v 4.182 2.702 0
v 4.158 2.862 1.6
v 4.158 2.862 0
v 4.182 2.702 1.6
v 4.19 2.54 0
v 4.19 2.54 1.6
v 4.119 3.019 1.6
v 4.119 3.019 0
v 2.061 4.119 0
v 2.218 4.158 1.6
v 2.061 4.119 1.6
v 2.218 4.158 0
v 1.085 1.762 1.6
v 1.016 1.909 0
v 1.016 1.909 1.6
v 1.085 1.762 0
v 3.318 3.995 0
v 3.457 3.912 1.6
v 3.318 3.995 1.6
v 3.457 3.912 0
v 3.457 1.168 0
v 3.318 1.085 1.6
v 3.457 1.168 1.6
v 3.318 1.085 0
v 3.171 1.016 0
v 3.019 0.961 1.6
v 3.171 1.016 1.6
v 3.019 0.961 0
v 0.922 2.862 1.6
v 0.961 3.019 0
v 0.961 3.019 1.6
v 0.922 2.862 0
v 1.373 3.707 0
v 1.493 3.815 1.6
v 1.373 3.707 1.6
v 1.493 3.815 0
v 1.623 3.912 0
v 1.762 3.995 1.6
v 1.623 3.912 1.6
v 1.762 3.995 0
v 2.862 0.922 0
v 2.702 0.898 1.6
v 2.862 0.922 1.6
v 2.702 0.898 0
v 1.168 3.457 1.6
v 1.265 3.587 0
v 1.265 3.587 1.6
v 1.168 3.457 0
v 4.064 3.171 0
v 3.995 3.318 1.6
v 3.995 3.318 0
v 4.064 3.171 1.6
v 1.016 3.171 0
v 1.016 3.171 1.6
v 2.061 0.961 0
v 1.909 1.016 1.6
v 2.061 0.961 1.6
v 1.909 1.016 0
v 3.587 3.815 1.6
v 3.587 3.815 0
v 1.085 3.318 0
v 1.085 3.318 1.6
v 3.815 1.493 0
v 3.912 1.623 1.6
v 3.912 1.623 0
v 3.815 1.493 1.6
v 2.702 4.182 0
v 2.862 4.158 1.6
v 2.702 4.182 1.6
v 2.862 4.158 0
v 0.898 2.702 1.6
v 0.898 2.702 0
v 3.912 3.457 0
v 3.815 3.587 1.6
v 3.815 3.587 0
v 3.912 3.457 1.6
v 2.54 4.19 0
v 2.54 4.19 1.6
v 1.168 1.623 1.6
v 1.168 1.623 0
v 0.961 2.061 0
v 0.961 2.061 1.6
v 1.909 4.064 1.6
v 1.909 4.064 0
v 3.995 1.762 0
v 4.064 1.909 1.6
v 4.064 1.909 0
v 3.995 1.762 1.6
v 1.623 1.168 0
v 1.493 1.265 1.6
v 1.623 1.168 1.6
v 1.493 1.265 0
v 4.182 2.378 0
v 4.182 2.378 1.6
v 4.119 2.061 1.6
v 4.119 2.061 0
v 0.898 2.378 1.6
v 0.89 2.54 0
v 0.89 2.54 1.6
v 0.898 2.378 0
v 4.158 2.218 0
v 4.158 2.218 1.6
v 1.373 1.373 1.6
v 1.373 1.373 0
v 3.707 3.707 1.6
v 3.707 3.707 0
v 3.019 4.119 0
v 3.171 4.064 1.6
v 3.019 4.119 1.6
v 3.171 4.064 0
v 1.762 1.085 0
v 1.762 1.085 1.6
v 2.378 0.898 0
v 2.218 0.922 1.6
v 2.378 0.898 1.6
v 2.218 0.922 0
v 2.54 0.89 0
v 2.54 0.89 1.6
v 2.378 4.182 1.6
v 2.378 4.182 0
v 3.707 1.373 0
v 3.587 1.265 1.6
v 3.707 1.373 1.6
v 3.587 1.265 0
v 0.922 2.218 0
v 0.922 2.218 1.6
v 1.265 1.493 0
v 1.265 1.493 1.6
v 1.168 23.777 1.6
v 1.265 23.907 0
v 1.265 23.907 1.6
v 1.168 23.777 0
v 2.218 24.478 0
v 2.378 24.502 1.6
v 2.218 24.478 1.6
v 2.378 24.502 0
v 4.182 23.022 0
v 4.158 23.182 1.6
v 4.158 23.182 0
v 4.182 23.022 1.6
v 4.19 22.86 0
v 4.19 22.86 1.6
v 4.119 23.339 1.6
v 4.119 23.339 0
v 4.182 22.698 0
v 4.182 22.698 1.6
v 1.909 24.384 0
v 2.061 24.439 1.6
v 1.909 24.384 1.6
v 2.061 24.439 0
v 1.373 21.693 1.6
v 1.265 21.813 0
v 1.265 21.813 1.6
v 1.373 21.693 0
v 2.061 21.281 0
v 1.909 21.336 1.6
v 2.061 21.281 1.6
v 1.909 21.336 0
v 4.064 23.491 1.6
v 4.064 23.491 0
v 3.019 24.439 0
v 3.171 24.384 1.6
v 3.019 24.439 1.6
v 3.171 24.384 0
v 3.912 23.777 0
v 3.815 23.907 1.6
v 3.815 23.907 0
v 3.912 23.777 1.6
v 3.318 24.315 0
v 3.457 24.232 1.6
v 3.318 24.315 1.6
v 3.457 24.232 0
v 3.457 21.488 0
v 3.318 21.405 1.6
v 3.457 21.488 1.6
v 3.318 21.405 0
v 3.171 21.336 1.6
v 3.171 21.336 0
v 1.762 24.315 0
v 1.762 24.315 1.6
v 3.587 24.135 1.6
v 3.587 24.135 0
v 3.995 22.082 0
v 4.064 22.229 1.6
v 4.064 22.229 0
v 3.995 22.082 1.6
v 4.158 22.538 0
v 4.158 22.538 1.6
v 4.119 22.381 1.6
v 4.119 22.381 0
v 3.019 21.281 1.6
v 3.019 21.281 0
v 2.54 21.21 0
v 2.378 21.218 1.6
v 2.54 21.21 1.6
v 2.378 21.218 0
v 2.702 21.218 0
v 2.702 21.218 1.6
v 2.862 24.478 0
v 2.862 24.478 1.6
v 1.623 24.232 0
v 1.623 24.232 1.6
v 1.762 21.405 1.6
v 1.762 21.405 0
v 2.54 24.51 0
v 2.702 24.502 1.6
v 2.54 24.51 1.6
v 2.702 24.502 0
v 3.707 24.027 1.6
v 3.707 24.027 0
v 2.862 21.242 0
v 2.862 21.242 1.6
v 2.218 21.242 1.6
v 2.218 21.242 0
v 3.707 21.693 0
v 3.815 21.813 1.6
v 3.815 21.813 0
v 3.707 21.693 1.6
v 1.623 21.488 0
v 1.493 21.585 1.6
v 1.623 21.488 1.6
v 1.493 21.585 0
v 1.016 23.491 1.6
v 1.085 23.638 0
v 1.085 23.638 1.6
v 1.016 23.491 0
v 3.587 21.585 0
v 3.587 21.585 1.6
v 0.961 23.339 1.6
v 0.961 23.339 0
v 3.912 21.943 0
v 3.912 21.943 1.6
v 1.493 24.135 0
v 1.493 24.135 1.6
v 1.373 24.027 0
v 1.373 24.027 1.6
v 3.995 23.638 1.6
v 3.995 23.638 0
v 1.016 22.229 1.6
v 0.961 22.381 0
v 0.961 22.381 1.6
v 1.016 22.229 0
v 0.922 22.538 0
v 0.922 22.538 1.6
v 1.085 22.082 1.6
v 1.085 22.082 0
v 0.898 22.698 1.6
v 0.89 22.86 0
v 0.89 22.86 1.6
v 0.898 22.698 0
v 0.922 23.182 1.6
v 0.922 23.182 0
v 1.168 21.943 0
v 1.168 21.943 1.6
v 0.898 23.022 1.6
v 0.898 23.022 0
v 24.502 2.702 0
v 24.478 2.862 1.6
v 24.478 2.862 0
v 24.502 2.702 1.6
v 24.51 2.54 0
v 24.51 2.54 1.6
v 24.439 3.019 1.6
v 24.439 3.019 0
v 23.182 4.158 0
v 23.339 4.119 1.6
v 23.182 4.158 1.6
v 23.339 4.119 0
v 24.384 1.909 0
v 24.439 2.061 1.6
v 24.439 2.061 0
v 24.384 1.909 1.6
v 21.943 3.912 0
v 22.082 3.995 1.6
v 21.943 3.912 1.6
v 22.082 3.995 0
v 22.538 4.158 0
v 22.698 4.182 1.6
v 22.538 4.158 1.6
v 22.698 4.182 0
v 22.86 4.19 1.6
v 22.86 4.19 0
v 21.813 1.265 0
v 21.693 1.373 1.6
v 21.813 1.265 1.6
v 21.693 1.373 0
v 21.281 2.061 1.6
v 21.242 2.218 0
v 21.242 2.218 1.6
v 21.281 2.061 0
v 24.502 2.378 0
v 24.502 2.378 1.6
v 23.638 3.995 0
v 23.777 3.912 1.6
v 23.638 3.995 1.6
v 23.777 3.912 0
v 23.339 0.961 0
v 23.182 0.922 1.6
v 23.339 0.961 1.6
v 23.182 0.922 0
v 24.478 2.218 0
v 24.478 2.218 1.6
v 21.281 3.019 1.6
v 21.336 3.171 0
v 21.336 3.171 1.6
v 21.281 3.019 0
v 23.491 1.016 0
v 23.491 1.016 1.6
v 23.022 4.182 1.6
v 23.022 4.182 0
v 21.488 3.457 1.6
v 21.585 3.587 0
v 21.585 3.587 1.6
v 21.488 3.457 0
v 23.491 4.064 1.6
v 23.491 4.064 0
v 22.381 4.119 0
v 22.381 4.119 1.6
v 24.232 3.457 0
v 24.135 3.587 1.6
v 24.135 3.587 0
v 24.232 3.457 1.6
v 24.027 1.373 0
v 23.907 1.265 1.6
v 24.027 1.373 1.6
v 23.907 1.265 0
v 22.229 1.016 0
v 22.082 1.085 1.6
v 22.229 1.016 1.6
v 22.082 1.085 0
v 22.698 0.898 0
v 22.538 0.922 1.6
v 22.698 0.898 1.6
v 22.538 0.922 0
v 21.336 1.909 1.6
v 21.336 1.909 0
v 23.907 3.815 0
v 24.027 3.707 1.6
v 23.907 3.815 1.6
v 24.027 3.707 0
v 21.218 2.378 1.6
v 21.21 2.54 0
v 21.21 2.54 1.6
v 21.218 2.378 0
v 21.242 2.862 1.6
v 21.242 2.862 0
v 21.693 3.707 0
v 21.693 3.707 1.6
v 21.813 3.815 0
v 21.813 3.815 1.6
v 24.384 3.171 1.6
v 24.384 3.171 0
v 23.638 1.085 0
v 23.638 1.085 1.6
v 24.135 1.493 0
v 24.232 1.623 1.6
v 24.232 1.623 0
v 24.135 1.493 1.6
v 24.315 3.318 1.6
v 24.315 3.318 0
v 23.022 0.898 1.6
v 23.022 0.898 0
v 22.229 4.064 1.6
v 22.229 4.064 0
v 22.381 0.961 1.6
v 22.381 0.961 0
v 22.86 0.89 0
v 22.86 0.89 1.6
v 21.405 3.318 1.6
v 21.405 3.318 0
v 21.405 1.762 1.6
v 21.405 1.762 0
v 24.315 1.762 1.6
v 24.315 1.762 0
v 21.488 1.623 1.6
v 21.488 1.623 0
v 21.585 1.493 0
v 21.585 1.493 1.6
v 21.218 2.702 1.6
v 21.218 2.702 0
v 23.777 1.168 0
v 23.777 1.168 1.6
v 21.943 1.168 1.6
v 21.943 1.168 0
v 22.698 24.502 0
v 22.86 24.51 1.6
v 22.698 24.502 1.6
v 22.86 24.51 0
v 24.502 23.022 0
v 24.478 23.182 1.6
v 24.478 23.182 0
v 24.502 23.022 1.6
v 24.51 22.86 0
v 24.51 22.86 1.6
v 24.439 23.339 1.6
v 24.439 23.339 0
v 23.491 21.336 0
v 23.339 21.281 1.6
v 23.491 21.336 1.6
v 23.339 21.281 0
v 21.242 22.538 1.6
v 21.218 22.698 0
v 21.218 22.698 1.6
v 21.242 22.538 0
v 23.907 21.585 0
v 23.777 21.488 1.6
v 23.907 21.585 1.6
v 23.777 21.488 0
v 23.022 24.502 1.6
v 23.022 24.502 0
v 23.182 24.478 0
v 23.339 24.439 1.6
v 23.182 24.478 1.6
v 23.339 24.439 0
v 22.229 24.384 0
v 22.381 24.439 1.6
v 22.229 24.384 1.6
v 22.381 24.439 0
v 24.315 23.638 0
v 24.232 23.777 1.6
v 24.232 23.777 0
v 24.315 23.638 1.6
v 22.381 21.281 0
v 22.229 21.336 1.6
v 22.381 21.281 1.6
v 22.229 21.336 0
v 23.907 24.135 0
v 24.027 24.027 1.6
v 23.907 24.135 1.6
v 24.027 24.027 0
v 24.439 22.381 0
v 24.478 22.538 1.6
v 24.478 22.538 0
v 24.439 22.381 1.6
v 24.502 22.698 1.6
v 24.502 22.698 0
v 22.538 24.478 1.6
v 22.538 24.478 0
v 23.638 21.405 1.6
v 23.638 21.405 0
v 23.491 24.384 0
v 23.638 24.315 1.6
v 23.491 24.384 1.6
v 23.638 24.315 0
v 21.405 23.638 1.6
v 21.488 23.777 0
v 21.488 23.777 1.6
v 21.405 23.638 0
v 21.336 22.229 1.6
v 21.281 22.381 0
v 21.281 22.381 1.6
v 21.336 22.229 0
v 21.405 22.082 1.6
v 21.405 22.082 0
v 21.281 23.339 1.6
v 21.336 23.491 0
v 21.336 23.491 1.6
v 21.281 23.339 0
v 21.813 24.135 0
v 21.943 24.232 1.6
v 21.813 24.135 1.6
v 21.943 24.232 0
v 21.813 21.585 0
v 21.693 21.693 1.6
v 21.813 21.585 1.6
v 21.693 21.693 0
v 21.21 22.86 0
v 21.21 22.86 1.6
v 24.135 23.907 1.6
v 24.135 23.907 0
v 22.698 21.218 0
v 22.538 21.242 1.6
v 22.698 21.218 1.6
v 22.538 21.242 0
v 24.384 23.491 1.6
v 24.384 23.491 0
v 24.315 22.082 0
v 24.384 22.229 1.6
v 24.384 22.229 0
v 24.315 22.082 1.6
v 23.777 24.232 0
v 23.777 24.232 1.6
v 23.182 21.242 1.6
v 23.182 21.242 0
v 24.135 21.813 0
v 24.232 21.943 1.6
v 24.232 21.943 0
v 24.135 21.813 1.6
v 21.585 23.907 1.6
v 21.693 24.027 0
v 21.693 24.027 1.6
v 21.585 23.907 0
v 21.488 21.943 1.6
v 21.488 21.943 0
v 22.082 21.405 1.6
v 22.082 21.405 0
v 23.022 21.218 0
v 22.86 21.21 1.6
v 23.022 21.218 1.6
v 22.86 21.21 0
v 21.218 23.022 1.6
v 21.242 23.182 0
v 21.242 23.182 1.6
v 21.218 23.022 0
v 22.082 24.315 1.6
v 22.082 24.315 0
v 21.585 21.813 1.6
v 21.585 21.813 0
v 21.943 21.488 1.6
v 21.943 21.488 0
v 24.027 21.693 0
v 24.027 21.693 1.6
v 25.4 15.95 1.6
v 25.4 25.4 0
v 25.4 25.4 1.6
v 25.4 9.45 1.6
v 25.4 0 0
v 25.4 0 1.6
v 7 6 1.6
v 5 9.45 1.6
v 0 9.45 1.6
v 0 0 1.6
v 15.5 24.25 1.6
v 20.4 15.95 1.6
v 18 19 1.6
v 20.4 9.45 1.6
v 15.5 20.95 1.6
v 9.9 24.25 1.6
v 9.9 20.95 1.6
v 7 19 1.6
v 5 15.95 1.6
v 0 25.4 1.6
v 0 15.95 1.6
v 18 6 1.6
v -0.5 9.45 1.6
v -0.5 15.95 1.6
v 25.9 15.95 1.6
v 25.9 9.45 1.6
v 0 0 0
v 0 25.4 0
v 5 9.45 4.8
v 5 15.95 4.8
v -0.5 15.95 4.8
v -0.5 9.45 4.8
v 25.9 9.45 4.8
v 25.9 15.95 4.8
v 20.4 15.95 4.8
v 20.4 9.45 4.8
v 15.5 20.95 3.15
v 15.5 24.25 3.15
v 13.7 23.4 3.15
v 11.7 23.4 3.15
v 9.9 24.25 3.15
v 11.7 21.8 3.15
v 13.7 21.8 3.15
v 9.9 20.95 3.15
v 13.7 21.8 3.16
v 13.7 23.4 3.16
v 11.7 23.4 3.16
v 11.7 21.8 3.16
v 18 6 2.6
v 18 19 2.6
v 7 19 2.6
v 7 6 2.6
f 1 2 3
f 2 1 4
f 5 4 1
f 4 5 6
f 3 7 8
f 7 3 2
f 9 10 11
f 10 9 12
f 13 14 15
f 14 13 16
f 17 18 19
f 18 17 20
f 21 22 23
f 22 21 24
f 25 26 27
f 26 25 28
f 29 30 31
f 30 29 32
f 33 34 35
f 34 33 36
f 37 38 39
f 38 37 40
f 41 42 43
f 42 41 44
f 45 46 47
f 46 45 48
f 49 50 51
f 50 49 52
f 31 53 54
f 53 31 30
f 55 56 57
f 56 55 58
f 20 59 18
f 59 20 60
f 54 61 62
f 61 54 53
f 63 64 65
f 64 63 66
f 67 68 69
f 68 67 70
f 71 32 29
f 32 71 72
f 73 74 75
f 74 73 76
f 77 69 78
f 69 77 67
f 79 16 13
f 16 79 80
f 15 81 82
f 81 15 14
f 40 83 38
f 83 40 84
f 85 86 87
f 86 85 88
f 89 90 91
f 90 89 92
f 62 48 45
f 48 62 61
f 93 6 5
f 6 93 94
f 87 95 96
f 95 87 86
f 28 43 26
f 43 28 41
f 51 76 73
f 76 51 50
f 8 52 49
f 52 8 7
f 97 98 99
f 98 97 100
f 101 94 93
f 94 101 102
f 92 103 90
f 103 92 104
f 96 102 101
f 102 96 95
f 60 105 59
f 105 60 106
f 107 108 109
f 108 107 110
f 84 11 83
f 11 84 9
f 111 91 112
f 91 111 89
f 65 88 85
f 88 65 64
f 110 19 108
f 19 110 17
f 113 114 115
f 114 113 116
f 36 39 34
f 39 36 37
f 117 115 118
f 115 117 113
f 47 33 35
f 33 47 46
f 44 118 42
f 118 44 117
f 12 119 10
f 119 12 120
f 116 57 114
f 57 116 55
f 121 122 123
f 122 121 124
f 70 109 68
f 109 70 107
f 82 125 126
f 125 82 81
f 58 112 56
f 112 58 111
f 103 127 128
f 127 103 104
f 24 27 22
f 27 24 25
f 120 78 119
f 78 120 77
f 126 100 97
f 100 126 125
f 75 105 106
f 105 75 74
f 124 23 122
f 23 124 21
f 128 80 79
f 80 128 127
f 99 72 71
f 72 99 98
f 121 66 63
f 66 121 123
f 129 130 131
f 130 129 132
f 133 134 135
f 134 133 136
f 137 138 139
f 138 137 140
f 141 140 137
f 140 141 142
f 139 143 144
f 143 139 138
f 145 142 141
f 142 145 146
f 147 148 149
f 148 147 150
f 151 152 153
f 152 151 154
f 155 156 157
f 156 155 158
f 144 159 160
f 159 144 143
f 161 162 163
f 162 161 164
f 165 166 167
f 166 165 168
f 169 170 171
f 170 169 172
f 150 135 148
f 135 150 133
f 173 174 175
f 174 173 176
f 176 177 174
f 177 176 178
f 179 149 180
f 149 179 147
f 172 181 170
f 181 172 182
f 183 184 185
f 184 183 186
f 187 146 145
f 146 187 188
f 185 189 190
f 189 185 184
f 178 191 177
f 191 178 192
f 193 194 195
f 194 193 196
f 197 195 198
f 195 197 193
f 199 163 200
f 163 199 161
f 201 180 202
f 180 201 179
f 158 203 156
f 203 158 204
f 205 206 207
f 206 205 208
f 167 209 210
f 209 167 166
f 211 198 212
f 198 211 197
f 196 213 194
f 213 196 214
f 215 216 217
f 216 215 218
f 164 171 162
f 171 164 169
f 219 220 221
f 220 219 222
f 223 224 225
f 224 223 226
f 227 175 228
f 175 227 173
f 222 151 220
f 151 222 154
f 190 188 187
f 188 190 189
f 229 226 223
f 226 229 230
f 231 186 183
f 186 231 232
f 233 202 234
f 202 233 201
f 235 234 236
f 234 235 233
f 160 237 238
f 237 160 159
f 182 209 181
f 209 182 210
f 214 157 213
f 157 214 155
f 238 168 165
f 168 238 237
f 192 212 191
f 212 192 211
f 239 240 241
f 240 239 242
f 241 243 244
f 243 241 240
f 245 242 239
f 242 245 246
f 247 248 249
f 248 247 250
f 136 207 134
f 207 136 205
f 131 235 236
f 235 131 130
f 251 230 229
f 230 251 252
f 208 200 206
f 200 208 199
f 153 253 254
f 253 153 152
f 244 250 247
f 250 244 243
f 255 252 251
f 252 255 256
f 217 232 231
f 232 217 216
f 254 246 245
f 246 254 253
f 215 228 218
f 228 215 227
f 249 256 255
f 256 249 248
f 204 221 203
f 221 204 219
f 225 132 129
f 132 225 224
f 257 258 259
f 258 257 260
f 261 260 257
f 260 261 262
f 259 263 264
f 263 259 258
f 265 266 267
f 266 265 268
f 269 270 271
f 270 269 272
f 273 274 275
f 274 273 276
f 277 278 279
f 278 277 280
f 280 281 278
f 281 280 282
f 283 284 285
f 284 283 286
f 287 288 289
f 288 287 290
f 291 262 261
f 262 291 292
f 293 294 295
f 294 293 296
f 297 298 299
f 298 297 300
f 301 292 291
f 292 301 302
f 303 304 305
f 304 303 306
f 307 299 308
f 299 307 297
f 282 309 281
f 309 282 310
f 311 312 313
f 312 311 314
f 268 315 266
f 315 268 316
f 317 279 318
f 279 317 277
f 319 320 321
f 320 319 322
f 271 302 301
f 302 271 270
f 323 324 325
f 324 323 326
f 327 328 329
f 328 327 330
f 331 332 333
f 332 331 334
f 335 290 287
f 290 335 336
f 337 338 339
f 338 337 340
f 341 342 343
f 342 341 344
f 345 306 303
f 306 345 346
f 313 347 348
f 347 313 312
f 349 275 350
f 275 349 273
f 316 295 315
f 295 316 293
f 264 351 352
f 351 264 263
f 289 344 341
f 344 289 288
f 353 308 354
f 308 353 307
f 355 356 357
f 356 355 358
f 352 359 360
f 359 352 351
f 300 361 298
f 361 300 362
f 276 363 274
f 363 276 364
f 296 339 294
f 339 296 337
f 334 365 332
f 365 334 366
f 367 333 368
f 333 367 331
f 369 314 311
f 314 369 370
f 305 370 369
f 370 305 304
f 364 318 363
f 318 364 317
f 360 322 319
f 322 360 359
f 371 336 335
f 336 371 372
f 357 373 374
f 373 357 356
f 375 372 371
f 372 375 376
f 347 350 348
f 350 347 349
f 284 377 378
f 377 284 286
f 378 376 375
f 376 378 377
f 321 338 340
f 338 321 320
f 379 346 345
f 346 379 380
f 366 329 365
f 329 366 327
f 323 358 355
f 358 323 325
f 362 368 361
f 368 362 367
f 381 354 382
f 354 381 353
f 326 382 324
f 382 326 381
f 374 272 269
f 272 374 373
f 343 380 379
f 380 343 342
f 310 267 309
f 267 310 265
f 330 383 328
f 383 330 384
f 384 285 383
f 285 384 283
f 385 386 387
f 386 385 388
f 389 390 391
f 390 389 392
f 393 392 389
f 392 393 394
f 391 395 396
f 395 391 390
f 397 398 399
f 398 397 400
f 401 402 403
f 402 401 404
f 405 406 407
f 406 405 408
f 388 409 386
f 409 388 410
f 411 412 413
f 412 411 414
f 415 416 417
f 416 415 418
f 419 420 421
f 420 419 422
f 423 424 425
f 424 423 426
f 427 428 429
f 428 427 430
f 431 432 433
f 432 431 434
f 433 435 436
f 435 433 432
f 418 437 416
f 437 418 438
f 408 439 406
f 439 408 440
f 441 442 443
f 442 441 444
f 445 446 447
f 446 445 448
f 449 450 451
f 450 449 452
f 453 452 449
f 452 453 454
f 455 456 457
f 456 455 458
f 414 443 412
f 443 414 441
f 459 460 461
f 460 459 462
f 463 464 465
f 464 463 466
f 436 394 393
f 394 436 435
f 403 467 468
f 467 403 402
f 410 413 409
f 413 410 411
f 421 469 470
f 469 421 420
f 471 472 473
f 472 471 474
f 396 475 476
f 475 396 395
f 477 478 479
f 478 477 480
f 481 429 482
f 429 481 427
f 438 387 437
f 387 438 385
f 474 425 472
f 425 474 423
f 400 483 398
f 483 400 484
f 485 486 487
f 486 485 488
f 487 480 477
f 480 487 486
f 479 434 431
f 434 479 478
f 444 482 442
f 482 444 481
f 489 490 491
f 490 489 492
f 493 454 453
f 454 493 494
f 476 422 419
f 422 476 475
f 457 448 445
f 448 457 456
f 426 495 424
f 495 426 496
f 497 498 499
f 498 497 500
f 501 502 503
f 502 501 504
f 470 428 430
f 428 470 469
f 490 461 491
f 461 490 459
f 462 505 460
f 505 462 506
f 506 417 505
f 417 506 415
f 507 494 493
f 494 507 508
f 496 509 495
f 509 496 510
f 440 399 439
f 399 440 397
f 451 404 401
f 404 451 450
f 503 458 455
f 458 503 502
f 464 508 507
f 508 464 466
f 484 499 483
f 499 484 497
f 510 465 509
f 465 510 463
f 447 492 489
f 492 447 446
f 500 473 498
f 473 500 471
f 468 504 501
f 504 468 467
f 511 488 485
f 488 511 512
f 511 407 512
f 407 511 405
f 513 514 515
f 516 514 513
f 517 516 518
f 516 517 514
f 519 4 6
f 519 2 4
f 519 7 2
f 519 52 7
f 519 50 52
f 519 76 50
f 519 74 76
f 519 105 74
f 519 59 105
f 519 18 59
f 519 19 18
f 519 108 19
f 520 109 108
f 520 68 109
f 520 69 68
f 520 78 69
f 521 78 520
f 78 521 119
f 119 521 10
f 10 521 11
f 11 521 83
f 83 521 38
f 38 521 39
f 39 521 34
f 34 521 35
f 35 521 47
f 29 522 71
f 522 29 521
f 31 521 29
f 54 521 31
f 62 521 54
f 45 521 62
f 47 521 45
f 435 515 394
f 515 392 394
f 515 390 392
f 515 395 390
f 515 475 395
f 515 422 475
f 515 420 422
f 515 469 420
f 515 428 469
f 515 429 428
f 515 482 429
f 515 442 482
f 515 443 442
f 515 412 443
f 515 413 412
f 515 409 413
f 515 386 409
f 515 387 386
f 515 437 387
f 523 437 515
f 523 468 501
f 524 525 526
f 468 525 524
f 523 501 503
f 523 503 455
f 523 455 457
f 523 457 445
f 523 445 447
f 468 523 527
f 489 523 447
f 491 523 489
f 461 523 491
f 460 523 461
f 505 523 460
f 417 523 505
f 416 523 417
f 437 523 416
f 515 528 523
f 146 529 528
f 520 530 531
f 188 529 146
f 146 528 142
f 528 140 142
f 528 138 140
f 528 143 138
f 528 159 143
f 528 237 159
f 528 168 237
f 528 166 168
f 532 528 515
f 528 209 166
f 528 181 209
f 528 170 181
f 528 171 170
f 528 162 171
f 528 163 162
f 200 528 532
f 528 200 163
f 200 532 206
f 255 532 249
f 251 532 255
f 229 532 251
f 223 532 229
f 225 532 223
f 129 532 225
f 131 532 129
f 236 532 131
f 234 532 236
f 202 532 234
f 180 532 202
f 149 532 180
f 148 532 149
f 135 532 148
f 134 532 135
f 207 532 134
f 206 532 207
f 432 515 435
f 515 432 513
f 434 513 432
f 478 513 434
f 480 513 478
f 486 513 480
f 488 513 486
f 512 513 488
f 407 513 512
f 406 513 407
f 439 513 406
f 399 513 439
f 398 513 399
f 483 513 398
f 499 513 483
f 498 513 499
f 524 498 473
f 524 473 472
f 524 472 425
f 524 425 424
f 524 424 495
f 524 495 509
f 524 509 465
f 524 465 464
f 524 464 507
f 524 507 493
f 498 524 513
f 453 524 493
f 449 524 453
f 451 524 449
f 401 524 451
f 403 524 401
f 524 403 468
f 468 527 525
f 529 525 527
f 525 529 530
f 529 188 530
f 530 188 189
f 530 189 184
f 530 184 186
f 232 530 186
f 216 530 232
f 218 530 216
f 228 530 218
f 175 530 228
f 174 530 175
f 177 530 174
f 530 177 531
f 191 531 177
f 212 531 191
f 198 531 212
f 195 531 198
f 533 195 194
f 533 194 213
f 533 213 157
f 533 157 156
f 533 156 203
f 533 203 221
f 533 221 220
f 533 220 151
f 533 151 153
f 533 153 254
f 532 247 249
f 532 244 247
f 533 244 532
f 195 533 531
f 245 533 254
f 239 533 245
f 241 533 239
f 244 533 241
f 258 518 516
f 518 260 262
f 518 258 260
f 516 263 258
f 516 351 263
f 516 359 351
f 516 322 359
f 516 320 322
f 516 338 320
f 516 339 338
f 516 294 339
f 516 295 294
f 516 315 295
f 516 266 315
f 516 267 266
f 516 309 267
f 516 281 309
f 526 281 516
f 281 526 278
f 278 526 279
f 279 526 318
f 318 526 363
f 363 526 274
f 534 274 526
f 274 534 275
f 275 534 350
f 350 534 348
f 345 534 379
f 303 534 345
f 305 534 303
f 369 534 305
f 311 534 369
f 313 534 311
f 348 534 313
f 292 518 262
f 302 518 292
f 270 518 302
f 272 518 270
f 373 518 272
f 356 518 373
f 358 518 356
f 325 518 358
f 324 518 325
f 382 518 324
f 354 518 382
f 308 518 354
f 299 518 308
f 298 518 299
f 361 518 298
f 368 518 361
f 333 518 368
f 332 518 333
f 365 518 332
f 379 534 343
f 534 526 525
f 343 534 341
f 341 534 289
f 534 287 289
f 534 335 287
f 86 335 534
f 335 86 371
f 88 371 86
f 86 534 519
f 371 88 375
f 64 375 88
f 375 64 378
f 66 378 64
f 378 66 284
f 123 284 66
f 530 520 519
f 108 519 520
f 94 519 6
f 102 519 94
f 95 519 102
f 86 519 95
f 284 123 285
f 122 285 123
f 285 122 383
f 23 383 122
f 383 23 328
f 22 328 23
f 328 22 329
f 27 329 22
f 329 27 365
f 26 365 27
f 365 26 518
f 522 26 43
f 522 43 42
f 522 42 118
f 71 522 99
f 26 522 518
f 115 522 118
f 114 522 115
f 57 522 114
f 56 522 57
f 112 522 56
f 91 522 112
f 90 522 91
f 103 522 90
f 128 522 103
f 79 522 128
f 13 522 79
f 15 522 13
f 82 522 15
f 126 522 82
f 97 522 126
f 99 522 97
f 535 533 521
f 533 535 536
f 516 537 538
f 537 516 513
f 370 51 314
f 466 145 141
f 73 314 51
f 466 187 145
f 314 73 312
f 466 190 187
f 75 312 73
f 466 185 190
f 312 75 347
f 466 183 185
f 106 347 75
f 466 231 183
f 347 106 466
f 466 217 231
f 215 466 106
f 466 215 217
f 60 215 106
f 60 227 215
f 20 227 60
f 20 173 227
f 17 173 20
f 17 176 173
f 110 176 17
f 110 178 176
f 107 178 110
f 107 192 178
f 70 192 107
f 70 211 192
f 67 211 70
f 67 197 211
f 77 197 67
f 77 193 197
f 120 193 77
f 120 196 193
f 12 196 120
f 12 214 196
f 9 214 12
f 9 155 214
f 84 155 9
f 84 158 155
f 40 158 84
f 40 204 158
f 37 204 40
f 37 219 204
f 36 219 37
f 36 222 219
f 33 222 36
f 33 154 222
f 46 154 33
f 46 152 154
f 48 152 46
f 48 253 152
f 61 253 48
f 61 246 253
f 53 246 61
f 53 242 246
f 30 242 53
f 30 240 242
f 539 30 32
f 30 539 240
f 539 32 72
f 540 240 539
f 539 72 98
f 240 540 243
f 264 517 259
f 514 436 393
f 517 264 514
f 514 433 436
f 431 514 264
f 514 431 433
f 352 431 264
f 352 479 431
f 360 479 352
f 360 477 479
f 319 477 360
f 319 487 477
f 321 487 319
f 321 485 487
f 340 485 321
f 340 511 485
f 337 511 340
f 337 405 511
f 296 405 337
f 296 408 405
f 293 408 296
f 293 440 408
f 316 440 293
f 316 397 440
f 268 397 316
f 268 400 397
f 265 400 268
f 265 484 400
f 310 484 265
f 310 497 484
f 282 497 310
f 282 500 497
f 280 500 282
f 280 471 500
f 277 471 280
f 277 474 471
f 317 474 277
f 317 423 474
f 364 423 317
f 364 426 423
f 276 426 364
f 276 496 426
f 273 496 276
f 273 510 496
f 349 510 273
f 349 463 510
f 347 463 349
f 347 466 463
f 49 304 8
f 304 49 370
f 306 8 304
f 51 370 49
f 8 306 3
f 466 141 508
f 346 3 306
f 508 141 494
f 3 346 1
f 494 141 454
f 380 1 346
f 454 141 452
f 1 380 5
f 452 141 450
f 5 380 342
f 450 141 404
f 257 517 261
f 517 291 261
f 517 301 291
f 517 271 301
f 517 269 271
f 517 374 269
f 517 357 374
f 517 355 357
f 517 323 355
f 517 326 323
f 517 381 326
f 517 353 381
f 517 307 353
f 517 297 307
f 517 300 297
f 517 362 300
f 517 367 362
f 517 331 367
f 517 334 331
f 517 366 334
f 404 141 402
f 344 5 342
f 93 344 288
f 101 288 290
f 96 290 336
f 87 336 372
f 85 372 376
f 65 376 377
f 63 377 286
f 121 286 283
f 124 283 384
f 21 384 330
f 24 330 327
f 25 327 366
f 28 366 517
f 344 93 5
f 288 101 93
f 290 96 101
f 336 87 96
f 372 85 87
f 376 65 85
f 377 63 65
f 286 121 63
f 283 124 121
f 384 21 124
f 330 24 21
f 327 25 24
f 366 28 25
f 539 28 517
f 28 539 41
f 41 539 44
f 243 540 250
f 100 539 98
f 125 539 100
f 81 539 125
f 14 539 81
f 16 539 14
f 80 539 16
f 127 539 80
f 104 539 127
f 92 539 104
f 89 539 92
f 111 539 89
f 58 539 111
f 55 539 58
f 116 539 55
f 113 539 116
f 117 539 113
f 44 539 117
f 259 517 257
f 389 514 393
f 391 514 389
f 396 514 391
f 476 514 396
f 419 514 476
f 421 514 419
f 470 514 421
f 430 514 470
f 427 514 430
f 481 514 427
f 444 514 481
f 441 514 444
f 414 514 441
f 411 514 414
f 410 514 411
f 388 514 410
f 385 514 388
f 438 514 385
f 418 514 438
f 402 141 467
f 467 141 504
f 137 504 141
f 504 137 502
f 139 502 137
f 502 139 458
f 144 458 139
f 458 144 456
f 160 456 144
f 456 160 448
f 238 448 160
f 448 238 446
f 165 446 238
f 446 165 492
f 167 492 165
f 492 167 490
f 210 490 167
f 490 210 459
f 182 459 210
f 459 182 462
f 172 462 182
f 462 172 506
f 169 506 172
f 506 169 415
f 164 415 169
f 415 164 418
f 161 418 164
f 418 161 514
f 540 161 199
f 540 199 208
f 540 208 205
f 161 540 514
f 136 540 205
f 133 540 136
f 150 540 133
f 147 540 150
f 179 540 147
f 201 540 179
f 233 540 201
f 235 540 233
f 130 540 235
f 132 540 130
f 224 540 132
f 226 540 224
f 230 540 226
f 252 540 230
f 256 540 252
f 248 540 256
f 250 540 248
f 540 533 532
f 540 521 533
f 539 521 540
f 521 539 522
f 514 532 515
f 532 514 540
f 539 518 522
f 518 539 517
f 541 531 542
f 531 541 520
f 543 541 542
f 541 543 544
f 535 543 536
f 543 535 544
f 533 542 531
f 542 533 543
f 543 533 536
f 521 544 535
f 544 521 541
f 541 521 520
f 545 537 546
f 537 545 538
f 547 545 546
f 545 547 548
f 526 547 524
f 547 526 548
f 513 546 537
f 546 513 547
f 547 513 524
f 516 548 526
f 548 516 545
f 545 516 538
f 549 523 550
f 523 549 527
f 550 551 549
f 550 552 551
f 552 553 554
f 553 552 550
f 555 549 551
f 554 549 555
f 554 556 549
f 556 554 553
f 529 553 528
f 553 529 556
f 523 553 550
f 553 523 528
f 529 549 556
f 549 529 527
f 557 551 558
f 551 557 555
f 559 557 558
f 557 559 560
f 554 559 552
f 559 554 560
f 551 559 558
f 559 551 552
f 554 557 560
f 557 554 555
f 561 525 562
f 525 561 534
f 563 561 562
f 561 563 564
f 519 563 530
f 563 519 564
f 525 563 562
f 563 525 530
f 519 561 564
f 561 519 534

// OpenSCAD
include <../common.scad>
// All PCB/package/connector envelopes are named in common.scad.
module max30101(){
 color([0.8,0.04,0.055])difference(){cube([sensor_board,sensor_board,sensor_pcb]); for(x=[sensor_hole_inset,sensor_board-sensor_hole_inset],y=[sensor_hole_inset,sensor_board-sensor_hole_inset])translate([x,y,-eps])cylinder(d=sensor_hole_d,h=sensor_pcb+2*eps);}
 color([0.1,0.1,0.12])translate([(sensor_board-sensor_w)/2,sensor_board-sensor_top_offset-sensor_l/2,sensor_pcb])cube([sensor_w,sensor_l,sensor_h]);
 color([0.15,0.03,0.05])translate([sensor_board/2-sensor_optical_size[0]/2,sensor_board-sensor_top_offset-sensor_optical_size[1]/2,sensor_pcb+sensor_h])cube(sensor_optical_size);
 color([0.07,0.07,0.08])for(x=[-sensor_connector_overhang,sensor_board-qwiic_w+sensor_connector_overhang])translate([x,(sensor_board-qwiic_l)/2,sensor_pcb])cube([qwiic_w,qwiic_l,qwiic_h]);
 // Low component envelope estimated from photo. No soldered bottom header assumed.
 color([0.14,0.14,0.15])translate([sensor_ic_pos[0],sensor_ic_pos[1],sensor_pcb])cube(sensor_ic_size);
}
max30101();
